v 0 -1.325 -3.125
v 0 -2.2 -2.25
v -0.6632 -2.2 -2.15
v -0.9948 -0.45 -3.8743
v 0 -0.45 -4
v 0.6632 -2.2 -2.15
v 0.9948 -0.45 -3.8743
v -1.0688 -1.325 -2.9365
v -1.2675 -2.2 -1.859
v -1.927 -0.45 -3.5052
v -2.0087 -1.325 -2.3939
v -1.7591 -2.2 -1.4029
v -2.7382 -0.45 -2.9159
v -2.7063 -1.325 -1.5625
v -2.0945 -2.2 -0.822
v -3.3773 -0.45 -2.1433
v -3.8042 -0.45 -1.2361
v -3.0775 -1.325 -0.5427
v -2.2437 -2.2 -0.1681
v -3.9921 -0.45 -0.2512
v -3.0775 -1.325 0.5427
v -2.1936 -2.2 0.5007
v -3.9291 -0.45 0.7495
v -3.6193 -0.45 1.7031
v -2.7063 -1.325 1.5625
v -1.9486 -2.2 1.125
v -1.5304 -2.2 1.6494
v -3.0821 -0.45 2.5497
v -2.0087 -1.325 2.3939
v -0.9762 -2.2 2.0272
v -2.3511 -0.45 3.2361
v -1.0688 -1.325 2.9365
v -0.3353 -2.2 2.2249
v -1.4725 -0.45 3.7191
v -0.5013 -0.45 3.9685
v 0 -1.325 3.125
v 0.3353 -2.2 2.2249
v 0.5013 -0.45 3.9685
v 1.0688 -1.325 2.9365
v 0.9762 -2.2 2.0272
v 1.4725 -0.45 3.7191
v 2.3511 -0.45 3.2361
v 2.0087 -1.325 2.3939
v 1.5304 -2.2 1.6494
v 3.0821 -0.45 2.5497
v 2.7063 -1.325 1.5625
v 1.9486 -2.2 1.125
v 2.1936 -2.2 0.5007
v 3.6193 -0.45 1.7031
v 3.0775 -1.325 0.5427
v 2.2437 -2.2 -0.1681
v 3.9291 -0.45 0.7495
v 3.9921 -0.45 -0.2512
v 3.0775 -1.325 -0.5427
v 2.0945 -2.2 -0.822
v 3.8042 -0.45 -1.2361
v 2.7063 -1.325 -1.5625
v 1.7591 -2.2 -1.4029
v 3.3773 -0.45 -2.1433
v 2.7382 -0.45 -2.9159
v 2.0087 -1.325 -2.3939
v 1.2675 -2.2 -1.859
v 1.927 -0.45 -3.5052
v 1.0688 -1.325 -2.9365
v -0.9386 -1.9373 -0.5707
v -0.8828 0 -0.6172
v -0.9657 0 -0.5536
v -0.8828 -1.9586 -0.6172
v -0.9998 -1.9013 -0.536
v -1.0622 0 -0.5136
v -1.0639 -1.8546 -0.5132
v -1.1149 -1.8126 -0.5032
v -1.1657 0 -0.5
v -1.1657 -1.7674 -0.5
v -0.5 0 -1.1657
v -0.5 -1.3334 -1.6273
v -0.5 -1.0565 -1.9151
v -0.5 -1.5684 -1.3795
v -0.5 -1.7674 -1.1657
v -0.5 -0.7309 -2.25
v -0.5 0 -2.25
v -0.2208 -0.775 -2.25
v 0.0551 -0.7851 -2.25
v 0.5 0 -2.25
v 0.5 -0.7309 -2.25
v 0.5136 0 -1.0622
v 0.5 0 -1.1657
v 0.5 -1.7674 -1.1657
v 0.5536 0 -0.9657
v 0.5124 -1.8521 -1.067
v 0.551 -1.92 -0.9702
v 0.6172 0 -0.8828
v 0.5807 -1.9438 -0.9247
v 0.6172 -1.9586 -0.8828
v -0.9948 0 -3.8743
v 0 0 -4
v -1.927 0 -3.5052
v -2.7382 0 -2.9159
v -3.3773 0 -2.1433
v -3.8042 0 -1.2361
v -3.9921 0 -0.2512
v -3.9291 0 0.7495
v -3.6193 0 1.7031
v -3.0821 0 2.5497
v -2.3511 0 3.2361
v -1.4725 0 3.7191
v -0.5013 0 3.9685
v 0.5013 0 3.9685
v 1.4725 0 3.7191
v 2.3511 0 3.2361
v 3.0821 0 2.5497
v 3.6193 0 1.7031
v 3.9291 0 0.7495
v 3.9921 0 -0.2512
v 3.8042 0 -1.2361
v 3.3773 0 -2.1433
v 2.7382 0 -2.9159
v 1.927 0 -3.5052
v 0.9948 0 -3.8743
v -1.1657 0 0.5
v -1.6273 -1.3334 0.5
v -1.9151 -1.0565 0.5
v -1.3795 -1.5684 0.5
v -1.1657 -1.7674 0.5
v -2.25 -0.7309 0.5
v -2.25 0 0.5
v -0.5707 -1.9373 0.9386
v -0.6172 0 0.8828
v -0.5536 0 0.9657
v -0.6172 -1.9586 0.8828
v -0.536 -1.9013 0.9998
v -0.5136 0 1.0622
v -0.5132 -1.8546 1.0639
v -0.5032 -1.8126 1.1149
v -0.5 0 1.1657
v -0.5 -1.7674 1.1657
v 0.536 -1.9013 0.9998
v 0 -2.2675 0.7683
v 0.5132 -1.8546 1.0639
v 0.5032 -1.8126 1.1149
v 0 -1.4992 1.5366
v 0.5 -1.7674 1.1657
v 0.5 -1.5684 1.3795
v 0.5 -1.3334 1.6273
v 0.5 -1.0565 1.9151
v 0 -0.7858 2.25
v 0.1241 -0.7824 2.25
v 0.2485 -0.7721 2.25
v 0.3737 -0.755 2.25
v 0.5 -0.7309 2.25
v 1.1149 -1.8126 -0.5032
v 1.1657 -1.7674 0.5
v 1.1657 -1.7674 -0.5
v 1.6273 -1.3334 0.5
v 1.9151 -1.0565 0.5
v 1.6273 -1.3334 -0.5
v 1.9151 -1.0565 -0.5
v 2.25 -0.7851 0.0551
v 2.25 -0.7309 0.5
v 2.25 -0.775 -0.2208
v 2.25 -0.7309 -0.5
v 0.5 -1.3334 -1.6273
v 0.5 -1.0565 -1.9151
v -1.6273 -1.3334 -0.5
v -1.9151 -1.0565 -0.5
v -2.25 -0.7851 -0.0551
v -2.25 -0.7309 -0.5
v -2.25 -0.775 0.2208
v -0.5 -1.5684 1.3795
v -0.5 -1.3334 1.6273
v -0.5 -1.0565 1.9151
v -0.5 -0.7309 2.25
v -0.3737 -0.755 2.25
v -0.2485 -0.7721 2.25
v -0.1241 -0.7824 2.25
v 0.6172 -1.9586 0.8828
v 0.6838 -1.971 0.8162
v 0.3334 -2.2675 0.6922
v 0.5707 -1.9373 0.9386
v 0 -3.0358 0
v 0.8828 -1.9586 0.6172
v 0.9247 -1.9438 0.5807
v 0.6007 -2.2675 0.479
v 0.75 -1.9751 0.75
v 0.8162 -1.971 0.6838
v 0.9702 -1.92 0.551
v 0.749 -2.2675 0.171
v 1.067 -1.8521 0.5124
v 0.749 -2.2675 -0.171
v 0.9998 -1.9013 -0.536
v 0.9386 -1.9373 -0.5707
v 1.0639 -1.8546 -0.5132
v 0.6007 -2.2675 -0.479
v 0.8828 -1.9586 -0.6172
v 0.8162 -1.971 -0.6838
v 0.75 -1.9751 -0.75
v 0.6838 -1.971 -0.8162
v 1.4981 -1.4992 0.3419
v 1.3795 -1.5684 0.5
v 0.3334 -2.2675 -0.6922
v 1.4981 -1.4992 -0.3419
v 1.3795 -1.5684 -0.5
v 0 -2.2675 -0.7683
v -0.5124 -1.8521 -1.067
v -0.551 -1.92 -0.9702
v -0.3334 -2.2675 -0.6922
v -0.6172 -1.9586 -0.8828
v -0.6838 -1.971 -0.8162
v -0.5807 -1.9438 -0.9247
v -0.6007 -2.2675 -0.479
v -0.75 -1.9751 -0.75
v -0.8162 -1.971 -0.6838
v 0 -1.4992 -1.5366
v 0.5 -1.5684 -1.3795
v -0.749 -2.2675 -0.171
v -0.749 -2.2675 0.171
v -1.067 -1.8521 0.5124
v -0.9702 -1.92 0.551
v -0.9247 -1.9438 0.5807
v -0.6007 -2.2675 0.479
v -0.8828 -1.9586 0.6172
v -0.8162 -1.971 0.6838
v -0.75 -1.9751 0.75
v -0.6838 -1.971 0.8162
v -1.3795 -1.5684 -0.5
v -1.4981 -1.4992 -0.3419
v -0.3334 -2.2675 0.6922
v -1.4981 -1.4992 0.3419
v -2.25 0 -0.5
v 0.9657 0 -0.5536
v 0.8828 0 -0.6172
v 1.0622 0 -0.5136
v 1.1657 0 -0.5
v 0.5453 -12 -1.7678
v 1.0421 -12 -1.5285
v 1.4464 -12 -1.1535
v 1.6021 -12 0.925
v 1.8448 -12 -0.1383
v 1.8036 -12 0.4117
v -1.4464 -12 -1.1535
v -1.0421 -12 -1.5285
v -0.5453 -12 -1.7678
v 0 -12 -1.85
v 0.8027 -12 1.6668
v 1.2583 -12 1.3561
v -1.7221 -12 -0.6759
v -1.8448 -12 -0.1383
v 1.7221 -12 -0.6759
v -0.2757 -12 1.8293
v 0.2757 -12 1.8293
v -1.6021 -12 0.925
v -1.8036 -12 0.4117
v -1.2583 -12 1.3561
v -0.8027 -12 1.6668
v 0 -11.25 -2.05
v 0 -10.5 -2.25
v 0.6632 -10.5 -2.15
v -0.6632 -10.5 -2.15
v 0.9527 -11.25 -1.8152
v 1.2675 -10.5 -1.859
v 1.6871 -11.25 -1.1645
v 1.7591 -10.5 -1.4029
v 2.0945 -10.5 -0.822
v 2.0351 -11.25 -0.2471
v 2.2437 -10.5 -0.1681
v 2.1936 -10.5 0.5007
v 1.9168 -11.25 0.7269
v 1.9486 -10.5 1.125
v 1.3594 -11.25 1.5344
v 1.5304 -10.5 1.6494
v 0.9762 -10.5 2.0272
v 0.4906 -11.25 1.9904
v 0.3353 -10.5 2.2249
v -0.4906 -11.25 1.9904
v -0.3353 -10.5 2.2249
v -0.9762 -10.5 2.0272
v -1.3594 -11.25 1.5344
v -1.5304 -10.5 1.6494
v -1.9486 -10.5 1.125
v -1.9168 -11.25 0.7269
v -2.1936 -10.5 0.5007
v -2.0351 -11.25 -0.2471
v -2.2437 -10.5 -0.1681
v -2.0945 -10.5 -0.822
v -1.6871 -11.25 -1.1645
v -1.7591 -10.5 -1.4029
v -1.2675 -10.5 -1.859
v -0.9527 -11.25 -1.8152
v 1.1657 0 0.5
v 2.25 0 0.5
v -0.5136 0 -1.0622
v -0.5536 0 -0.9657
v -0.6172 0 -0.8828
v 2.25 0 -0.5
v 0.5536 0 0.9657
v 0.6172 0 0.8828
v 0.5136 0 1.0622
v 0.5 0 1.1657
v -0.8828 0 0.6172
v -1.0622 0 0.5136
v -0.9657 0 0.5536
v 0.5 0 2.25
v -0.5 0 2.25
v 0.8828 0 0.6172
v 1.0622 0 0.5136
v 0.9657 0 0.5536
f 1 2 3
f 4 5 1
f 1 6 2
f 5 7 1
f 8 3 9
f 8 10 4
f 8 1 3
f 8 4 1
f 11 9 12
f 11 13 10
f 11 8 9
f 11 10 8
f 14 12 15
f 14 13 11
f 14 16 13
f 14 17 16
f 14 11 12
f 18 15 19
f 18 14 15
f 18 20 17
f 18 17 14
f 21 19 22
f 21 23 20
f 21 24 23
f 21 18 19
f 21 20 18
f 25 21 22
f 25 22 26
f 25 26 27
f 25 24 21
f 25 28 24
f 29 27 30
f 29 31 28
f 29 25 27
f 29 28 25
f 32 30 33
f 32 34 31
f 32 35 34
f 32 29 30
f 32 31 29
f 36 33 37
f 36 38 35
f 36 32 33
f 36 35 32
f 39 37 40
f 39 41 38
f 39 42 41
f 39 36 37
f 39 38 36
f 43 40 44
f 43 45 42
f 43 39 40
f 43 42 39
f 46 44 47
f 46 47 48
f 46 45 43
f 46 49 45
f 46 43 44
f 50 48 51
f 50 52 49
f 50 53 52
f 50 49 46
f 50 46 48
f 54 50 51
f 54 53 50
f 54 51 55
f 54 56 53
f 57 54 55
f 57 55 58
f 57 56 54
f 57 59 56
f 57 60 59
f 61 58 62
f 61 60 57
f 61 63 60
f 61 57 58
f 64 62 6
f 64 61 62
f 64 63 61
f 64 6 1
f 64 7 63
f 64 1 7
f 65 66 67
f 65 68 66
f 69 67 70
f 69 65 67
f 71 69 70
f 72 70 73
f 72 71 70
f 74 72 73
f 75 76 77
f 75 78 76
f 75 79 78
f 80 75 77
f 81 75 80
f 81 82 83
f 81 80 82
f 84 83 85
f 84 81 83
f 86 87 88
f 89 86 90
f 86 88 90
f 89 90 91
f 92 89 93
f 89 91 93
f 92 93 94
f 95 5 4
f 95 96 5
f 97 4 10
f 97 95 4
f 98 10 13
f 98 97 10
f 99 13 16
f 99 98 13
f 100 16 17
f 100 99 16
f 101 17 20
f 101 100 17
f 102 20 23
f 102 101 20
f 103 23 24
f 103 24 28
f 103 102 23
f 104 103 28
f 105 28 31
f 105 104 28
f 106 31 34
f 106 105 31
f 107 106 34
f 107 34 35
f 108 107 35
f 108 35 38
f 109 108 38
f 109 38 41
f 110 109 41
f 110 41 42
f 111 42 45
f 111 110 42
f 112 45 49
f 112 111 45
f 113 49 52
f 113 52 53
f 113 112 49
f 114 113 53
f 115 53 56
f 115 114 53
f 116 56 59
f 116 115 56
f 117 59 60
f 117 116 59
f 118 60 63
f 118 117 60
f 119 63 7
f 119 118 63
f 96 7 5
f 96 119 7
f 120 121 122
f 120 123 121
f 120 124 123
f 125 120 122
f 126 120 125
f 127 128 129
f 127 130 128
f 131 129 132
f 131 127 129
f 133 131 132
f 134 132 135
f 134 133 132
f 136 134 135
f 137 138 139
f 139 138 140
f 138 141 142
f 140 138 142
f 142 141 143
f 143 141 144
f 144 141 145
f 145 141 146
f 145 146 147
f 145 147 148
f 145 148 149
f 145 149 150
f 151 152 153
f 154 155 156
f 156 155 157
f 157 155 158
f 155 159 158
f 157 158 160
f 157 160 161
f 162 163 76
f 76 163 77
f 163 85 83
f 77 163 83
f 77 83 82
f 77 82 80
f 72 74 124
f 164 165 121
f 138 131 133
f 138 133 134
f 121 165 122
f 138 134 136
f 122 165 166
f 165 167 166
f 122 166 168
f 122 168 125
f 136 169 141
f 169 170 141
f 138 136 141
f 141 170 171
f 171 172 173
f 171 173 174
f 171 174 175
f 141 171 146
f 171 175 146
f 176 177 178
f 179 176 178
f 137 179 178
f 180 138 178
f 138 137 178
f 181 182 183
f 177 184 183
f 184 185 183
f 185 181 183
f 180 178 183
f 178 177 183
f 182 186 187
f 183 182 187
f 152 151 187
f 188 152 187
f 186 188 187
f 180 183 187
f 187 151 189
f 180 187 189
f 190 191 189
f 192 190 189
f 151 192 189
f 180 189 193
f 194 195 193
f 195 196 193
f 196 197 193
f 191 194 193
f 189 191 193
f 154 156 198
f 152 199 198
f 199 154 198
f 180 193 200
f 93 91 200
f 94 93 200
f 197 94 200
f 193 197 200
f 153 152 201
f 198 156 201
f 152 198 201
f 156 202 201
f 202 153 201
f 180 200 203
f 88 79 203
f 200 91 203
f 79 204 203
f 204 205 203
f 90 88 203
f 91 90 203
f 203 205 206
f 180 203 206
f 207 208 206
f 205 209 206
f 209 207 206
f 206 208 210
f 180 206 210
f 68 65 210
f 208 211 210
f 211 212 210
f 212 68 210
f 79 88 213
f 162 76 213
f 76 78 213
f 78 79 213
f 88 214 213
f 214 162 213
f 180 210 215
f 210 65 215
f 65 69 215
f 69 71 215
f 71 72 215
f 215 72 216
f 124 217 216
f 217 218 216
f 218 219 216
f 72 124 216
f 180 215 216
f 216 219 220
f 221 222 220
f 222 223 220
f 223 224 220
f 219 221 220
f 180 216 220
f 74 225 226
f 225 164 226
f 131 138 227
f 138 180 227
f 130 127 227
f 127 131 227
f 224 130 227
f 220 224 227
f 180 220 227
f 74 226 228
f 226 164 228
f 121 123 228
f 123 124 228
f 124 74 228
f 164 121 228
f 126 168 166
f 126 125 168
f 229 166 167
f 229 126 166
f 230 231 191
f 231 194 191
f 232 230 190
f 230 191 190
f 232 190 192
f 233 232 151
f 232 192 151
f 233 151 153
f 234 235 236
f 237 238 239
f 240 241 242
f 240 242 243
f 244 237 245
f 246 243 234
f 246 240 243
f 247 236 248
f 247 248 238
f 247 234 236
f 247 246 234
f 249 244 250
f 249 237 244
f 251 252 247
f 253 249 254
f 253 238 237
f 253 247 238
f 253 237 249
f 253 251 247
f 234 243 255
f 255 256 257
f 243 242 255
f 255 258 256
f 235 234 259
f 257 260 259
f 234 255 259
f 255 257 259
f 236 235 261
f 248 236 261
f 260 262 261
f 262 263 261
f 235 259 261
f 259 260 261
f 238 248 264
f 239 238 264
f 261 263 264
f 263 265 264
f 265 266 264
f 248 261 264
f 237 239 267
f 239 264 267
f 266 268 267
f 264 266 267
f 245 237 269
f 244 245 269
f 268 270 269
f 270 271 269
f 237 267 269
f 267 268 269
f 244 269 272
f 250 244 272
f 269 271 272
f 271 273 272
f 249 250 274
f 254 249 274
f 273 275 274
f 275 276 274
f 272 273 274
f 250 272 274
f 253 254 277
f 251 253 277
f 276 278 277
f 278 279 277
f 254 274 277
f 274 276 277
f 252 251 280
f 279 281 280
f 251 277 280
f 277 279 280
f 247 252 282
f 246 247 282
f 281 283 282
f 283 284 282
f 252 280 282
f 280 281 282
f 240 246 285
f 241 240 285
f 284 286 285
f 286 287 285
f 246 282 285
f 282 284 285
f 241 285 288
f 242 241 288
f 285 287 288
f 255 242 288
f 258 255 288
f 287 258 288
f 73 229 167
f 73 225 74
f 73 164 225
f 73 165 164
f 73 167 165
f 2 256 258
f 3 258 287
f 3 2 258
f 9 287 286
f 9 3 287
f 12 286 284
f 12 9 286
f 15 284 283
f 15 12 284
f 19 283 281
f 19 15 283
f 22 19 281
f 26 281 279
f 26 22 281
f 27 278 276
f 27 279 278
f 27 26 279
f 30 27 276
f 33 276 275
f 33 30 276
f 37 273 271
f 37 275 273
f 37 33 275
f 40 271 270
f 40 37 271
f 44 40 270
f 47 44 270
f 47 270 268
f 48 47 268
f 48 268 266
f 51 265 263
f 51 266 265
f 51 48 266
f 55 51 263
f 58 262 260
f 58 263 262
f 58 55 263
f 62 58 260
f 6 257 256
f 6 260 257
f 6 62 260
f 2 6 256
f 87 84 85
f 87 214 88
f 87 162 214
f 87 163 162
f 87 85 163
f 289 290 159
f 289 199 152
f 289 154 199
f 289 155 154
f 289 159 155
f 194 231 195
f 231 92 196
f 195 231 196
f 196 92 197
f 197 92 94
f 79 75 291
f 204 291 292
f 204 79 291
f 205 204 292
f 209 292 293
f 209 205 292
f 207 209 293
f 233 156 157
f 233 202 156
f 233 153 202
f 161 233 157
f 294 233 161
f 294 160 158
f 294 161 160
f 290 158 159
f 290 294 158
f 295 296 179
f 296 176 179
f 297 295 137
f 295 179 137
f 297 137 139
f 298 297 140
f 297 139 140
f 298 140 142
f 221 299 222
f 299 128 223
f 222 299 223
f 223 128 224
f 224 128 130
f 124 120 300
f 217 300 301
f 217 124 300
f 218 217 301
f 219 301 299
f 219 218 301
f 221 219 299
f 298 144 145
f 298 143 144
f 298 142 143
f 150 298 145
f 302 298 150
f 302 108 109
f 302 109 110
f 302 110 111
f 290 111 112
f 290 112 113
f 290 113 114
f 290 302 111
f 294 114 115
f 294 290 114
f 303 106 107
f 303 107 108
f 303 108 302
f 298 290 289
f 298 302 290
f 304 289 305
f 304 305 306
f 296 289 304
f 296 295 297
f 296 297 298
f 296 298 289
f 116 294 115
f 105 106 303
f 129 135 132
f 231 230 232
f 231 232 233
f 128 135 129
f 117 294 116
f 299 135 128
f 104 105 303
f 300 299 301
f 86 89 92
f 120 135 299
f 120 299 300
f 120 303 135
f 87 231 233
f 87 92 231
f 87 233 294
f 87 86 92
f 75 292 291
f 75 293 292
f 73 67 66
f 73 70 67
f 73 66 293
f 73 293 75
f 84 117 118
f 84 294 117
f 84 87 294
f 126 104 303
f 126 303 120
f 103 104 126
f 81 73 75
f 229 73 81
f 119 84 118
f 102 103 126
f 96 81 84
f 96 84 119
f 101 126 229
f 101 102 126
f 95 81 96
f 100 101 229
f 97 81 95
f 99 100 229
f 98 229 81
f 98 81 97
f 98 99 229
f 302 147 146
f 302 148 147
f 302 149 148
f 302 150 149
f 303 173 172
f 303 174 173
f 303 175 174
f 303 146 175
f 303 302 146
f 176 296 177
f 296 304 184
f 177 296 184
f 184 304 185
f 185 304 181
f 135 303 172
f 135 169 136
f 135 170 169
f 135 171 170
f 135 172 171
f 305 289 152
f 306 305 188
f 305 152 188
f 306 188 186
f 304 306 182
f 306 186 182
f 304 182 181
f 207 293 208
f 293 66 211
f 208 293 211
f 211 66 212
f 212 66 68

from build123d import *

# Parameters (mm, degrees)
CUT_EXTRUDE2_REACH = 15.266
CHAMFER1_SIZE      = 0.5
FILLET1_R          = 0.4


with BuildPart() as part:
    # Sketch1 → Revolve1 (revolve)
    with BuildSketch(Plane.XY, mode=Mode.PRIVATE) as revolve1_sk:
        Polygon((0, 0), (0, -12), (2.25, -12), (2.25, -2.2), (4, -0.45), (4, 0), align=None)
    revolve(revolve1_sk.sketch.rotate(Axis((0, 0, 0), (0, 1, 0)), 90), axis=Axis((0, 0, 0), (0, 1, 0)))

    # Sketch4 → Cut-Revolve1 (revolve, cut)
    with BuildSketch(Plane(origin=(0, 0, 0), x_dir=(0, 0, -1), z_dir=(1, 0, 0))):
        Polygon((1.85, -12), (2.25, -10.5), (2.25, -12), align=None)
    revolve(axis=Axis((0, 0, 0), (0, -1, 0)), mode=Mode.SUBTRACT)

    # Cut-Extrude2: up to this cone (the profile starts inside it)
    cut_extrude2_end = Plane(origin=(0, 0, 0), z_dir=(0, 1, 0)).offset(-3.035785438) * Cone(1e-06, 21.837572875, 21.837571875, align=(Align.CENTER, Align.CENTER, Align.MIN), mode=Mode.PRIVATE)
    # Sketch6 → Cut-Extrude2 (cut, up to the surface)
    with BuildSketch(Plane(origin=(0, 0, 0), x_dir=(1, 0, 0), z_dir=(0, 1, 0)), mode=Mode.PRIVATE) as cut_extrude2_sk1:
        Polygon((-0.5, 2.25), (0.5, 2.25), (0.5, 0.5), (2.25, 0.5), (2.25, -0.5), (0.5, -0.5), (0.5, -2.25), (-0.5, -2.25), (-0.5, -0.5), (-2.25, -0.5), (-2.25, 0.5), (-0.5, 0.5), align=None)
    cut_extrude2_tool1 = extrude(cut_extrude2_sk1.sketch, amount=-CUT_EXTRUDE2_REACH, mode=Mode.PRIVATE) & cut_extrude2_end
    add(cut_extrude2_tool1.solids().sort_by_distance((0, 0, 0))[0], mode=Mode.SUBTRACT)

    # Chamfer1
    chamfer1_edges = [part.edges().sort_by_distance(p)[0] for p in [
        (0.5, -1.164339828, 0.5),
        (-0.5, -1.164339828, 0.5),
        (0.5, -1.164339828, -0.5),
        (-0.5, -1.164339828, -0.5),
    ]]
    chamfer(chamfer1_edges, length=CHAMFER1_SIZE)

    # Fillet1
    fillet1_edges = [part.edges().sort_by_distance(p)[0] for p in [
        (-1, -0.958876224, 0.5),
        (-0.5, -0.958876224, 1),
        (0.5, -0.958876224, 1),
        (1, -0.958876224, 0.5),
        (1, -0.958876224, -0.5),
        (0.5, -0.958876224, -1),
        (-0.5, -0.958876224, -1),
        (-1, -0.958876224, -0.5),
    ]]
    fillet(fillet1_edges, radius=FILLET1_R)


solid = part.part
